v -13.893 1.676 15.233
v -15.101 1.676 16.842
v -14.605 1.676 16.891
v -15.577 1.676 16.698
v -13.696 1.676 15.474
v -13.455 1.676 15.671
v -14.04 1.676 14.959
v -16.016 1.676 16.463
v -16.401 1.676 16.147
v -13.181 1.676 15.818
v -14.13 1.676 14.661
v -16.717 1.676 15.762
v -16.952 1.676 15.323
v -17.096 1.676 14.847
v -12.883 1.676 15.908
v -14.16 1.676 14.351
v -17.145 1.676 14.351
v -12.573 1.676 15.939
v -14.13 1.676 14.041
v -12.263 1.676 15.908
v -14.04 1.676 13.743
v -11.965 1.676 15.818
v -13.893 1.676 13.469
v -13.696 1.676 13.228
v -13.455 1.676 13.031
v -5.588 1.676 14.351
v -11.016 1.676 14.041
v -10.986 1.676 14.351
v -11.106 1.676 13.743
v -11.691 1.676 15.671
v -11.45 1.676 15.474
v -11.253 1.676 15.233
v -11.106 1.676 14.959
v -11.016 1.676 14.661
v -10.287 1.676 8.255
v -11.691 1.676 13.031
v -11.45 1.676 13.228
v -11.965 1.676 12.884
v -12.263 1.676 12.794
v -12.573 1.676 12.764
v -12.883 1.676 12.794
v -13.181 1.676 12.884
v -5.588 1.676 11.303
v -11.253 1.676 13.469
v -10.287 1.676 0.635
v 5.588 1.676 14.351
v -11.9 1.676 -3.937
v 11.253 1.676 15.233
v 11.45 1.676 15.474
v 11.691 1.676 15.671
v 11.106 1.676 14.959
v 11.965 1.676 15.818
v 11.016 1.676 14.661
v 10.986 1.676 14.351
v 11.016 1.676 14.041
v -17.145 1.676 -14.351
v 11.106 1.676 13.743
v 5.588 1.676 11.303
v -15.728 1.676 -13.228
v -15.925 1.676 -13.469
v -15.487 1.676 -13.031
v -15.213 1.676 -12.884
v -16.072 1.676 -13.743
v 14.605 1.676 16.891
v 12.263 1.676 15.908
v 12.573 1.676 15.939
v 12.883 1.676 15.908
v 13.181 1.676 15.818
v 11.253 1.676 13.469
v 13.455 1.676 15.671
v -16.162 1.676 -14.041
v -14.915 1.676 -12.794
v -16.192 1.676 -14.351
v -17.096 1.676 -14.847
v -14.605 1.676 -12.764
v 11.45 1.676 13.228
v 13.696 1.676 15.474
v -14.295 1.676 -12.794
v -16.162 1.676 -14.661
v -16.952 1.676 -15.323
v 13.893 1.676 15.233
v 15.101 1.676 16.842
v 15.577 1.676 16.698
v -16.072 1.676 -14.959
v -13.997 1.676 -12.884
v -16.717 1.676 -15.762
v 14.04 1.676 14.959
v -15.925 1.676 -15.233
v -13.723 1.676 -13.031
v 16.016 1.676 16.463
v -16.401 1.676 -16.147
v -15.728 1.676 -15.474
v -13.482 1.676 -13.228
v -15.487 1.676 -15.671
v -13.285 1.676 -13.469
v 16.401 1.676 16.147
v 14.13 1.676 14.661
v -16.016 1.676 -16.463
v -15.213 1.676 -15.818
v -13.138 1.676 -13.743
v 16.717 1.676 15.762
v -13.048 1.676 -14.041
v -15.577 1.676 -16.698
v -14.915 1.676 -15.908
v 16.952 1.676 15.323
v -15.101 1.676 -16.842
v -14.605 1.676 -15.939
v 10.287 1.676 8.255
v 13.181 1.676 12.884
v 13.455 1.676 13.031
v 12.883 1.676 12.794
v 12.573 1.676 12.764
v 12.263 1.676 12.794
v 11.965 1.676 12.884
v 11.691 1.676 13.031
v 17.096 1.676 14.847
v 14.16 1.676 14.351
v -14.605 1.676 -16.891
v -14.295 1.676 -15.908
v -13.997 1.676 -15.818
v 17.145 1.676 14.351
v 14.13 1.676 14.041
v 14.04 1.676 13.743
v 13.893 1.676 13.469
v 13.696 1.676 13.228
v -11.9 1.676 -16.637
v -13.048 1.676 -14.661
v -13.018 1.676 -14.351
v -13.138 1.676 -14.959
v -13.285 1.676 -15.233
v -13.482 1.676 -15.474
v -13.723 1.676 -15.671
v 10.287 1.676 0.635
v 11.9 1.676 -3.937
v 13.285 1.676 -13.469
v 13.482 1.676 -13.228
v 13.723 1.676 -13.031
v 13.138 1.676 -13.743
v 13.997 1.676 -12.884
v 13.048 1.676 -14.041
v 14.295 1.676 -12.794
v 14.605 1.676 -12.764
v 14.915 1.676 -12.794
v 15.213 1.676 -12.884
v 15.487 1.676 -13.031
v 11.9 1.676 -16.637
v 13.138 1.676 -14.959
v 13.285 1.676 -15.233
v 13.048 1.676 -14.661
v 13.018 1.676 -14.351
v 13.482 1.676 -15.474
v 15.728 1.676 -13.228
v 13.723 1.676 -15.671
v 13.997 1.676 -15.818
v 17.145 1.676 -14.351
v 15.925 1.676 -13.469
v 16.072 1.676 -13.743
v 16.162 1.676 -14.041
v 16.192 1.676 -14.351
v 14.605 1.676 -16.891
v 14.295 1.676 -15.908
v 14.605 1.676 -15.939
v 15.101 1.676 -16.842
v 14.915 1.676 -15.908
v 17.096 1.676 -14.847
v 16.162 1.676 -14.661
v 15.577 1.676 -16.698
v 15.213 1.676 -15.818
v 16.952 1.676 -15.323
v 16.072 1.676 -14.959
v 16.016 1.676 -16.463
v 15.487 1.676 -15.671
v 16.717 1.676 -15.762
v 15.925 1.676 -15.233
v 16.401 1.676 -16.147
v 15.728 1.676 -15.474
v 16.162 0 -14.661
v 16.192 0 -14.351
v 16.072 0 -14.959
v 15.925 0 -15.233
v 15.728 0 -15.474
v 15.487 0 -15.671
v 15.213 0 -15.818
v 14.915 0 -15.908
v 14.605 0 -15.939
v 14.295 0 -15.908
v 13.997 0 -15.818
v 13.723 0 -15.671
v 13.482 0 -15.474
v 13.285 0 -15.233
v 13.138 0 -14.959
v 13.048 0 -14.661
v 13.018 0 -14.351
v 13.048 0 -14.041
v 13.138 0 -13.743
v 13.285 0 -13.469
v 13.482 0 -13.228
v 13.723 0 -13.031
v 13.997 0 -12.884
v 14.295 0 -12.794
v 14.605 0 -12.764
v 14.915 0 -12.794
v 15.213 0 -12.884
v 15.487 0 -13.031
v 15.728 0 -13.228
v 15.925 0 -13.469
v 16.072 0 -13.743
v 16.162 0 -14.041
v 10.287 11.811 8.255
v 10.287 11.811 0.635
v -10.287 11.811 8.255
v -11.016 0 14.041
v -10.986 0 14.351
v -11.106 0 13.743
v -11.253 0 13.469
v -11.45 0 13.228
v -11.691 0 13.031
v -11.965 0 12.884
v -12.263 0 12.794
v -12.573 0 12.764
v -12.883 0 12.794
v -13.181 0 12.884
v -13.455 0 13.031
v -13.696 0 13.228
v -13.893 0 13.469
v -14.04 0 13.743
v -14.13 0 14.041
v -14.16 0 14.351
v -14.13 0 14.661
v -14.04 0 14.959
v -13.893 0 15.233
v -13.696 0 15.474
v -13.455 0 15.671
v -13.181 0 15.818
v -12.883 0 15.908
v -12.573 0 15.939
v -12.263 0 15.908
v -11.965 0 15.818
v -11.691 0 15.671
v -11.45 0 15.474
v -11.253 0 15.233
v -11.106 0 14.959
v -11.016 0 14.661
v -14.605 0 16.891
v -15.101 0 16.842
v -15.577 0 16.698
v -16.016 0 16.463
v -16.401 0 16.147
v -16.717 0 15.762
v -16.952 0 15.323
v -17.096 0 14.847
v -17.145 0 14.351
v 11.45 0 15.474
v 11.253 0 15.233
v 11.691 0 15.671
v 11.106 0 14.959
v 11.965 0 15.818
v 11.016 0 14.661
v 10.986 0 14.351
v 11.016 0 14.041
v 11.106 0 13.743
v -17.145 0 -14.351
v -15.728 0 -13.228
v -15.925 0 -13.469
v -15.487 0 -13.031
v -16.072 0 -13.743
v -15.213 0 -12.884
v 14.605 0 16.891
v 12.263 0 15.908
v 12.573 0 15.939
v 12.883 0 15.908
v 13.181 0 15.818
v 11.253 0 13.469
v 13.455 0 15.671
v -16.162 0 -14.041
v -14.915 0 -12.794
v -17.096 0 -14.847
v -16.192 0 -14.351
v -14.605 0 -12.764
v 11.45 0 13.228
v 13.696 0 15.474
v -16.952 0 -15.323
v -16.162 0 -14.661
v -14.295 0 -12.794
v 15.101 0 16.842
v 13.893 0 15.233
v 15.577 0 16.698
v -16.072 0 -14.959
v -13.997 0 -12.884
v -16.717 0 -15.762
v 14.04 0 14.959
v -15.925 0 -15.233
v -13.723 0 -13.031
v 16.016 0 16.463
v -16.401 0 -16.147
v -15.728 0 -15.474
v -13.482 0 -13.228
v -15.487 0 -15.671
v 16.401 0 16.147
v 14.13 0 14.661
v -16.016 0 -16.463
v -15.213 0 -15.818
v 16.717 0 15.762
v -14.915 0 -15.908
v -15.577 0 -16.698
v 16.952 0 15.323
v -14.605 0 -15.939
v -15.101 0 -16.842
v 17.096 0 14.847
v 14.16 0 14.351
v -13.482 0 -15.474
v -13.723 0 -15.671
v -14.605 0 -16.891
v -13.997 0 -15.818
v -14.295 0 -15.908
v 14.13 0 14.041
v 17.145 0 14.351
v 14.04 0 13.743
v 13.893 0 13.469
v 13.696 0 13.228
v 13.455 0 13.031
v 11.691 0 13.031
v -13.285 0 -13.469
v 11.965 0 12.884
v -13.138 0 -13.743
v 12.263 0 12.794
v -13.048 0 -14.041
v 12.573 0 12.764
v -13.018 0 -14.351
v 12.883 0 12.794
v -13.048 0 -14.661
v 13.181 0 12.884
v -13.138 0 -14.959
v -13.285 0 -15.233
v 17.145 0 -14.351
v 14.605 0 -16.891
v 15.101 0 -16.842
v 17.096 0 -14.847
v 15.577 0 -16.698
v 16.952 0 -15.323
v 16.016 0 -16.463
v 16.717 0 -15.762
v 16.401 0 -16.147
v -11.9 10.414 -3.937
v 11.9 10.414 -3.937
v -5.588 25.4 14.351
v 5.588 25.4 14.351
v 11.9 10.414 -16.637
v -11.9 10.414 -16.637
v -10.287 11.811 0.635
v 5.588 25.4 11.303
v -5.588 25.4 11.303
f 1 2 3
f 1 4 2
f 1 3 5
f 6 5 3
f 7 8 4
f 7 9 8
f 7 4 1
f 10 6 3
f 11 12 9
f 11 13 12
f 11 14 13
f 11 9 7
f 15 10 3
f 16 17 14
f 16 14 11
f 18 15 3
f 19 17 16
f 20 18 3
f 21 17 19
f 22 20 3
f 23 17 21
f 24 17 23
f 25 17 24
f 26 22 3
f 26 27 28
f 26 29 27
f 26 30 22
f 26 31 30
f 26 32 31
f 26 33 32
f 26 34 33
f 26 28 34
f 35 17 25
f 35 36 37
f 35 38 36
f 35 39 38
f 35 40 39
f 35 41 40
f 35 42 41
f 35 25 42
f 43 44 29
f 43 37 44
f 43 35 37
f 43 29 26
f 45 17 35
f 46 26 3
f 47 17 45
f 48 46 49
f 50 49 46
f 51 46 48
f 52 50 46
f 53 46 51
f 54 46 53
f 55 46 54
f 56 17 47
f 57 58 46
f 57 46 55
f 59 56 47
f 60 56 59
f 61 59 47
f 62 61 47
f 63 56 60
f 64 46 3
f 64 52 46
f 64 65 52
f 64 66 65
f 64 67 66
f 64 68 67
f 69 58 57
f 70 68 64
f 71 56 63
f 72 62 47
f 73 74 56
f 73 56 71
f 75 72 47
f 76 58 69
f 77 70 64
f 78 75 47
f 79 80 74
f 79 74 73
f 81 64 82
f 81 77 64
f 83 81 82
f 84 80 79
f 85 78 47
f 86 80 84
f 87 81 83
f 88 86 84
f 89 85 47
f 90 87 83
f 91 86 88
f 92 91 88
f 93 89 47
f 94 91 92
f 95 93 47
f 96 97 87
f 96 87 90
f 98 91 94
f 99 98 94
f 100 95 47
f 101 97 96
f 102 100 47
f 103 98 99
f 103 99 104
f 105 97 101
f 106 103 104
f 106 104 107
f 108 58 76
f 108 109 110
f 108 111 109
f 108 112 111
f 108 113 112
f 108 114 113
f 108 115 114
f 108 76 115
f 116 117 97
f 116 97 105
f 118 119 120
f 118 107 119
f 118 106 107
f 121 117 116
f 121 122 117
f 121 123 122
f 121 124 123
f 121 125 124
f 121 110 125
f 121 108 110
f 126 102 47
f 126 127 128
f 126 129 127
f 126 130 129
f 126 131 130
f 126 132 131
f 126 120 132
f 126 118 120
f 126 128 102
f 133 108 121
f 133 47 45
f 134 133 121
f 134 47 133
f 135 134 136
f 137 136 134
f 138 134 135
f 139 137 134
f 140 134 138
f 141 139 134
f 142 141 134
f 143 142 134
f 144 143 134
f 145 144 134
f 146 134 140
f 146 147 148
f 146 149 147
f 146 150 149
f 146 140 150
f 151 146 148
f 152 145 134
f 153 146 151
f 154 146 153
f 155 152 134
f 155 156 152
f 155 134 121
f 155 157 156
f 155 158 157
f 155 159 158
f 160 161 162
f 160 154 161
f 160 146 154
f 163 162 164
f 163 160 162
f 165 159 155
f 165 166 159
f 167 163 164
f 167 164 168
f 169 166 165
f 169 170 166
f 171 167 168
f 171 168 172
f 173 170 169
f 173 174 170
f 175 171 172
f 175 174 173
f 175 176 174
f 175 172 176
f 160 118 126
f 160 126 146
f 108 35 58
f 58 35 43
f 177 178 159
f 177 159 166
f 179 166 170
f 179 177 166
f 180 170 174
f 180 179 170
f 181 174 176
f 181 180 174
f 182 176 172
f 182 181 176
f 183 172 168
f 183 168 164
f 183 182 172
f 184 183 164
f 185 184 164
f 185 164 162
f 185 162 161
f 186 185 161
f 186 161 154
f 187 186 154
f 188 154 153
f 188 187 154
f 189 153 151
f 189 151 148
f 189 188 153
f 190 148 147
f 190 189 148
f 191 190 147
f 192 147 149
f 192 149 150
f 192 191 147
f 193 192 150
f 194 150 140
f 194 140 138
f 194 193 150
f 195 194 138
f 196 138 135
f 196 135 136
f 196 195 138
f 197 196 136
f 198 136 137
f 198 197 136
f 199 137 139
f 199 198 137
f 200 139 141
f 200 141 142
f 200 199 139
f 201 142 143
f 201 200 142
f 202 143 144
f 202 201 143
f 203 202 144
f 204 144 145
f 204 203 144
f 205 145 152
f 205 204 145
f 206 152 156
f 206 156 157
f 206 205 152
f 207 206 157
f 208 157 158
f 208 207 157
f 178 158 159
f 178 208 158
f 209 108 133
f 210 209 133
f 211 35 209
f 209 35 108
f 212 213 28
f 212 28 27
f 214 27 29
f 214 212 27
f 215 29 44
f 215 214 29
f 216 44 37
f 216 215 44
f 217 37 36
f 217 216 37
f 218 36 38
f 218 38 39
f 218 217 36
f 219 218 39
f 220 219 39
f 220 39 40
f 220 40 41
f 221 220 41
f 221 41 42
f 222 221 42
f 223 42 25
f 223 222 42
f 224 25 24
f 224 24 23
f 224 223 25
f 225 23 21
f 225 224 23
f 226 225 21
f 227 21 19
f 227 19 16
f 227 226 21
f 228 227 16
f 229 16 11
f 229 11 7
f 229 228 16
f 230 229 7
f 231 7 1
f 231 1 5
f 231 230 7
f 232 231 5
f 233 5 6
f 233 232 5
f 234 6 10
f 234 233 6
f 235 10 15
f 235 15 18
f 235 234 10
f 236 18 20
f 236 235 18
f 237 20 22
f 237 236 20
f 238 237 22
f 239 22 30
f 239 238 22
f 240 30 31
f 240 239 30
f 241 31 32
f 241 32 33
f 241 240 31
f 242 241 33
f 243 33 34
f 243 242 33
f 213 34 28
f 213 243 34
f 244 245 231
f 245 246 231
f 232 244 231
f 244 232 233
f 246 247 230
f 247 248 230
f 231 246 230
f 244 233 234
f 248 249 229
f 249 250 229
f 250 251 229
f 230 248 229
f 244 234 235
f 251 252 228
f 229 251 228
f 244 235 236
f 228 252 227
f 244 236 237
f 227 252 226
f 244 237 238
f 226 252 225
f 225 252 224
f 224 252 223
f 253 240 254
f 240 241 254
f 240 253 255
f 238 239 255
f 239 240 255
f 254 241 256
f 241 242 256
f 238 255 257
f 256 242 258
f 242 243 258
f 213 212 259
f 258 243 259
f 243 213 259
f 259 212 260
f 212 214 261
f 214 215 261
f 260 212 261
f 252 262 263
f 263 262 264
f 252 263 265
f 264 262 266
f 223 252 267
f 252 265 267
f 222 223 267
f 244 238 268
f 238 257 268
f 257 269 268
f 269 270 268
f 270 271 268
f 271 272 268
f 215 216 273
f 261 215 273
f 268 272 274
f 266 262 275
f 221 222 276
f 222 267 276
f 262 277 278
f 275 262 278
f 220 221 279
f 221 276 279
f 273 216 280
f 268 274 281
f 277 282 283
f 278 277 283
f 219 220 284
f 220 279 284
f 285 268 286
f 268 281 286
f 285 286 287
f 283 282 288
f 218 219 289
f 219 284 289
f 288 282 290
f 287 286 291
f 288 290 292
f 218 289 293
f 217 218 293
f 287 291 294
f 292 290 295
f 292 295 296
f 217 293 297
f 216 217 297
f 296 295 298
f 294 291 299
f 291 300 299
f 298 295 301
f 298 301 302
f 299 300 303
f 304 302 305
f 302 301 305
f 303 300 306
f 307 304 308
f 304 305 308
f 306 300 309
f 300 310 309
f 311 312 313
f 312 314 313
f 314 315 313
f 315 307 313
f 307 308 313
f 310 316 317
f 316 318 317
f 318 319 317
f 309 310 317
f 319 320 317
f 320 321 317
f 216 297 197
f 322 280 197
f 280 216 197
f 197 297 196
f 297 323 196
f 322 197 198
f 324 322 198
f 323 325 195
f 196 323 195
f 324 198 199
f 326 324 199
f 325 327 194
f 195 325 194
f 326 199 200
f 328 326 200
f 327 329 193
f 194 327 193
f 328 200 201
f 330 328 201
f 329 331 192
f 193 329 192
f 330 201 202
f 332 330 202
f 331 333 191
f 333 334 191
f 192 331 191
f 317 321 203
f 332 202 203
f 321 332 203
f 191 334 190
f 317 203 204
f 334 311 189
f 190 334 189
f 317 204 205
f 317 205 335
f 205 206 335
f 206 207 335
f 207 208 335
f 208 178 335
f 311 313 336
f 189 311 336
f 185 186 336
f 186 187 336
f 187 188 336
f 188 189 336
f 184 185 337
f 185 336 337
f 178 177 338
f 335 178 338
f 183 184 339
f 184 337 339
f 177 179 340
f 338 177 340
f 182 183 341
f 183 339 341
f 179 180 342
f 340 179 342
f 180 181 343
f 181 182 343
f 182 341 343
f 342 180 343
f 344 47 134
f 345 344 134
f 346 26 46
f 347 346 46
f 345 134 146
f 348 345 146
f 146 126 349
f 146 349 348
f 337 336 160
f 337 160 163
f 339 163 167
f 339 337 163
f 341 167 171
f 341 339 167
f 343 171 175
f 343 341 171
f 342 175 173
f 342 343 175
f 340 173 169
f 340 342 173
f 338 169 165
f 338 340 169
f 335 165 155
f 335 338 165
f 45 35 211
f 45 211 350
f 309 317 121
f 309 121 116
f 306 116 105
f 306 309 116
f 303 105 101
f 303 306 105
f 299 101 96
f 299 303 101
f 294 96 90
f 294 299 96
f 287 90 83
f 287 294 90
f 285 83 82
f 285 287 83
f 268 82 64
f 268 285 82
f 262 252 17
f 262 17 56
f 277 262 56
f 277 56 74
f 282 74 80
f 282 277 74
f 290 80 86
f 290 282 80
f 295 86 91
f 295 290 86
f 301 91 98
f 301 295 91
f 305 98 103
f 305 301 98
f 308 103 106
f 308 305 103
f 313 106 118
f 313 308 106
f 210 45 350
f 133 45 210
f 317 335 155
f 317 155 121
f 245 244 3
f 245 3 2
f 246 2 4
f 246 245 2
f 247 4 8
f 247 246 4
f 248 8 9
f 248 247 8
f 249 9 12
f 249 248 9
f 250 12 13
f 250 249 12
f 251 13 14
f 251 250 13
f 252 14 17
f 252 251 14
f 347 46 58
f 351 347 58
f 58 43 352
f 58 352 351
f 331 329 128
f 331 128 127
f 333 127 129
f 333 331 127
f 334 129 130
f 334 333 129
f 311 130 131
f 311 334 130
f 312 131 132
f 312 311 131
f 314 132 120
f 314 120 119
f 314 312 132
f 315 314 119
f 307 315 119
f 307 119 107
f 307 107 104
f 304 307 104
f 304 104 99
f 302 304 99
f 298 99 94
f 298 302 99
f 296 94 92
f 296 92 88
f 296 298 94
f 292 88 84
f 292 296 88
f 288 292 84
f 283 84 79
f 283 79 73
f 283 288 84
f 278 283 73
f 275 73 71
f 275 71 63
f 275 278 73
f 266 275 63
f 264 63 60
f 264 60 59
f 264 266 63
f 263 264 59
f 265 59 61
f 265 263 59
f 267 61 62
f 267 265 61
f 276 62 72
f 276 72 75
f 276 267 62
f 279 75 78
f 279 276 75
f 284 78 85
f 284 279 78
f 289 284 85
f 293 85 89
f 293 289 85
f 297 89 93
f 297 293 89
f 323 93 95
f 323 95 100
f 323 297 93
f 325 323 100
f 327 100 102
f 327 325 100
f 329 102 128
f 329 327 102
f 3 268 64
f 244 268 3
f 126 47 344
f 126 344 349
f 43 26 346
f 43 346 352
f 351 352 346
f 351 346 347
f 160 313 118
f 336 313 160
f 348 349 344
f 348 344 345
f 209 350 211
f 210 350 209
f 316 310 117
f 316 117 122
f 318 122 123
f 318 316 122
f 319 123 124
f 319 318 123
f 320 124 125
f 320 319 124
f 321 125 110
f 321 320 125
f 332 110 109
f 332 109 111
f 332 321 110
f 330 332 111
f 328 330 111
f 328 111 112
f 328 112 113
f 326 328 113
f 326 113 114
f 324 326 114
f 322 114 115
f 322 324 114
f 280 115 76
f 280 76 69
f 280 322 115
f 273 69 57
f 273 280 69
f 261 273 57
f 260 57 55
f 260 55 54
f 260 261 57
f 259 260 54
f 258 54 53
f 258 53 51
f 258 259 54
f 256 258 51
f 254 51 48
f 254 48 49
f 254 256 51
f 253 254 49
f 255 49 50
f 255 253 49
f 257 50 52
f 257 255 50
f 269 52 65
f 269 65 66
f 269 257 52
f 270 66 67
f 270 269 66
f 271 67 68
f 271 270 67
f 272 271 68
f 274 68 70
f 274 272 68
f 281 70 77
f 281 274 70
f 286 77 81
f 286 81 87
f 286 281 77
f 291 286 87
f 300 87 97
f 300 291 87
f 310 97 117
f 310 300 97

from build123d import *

# Parameters (mm, degrees)
SKETCH1_R           = 1.5875
BOSS_EXTRUDE1_DEPTH = 1.6764
SKETCH1_3_W         = 23.7998
SKETCH1_3_H         = 12.7
BOSS_EXTRUDE2_DEPTH = 10.414
SKETCH1_4_W         = 20.574
SKETCH1_4_H         = 7.62
BOSS_EXTRUDE3_DEPTH = 11.811
SKETCH1_5_W         = 11.176
SKETCH1_5_H         = 3.048
BOSS_EXTRUDE4_DEPTH = 25.4


with BuildPart() as part:
    # Sketch1 → Boss-Extrude1 (new body)
    with BuildSketch(Plane(origin=(0, 0, 0), x_dir=(1, 0, 0), z_dir=(0, 1, 0))):
        with BuildLine():
            ThreePointArc((-17.145, -14.351), (-16.401051224, -16.147051224), (-14.605, -16.891))
            Line((-14.605, -16.891), (14.605, -16.891))
            ThreePointArc((14.605, -16.891), (16.401051224, -16.147051224), (17.145, -14.351))
            Line((17.145, -14.351), (17.145, 14.351))
            ThreePointArc((17.145, 14.351), (16.401051224, 16.147051224), (14.605, 16.891))
            Line((14.605, 16.891), (-14.605, 16.891))
            ThreePointArc((-14.605, 16.891), (-16.401051224, 16.147051224), (-17.145, 14.351))
            Line((-17.145, 14.351), (-17.145, -14.351))
        make_face()
        with Locations((-12.573, -14.351)):
            Circle(SKETCH1_R, mode=Mode.SUBTRACT)
        with Locations((12.573, -14.351)):
            Circle(SKETCH1_R, mode=Mode.SUBTRACT)
        with Locations((-14.605, 14.351)):
            Circle(SKETCH1_R, mode=Mode.SUBTRACT)
        with Locations((14.605, 14.351)):
            Circle(SKETCH1_R, mode=Mode.SUBTRACT)
    extrude(amount=BOSS_EXTRUDE1_DEPTH)

    # Sketch1<3> → Boss-Extrude2 (add)
    with BuildSketch(Plane(origin=(0, 0, 0), x_dir=(1, 0, 0), z_dir=(0, 1, 0))):
        with Locations((0, 10.287)):
            Rectangle(SKETCH1_3_W, SKETCH1_3_H)
    extrude(amount=BOSS_EXTRUDE2_DEPTH)

    # Sketch1<4> → Boss-Extrude3 (add)
    with BuildSketch(Plane(origin=(0, 0, 0), x_dir=(1, 0, 0), z_dir=(0, 1, 0))):
        with Locations((0, -4.445)):
            Rectangle(SKETCH1_4_W, SKETCH1_4_H)
    extrude(amount=BOSS_EXTRUDE3_DEPTH)

    # Sketch1<5> → Boss-Extrude4 (add)
    with BuildSketch(Plane(origin=(0, 0, 0), x_dir=(1, 0, 0), z_dir=(0, 1, 0))):
        with Locations((0, -12.827)):
            Rectangle(SKETCH1_5_W, SKETCH1_5_H)
    extrude(amount=BOSS_EXTRUDE4_DEPTH)


solid = part.part
